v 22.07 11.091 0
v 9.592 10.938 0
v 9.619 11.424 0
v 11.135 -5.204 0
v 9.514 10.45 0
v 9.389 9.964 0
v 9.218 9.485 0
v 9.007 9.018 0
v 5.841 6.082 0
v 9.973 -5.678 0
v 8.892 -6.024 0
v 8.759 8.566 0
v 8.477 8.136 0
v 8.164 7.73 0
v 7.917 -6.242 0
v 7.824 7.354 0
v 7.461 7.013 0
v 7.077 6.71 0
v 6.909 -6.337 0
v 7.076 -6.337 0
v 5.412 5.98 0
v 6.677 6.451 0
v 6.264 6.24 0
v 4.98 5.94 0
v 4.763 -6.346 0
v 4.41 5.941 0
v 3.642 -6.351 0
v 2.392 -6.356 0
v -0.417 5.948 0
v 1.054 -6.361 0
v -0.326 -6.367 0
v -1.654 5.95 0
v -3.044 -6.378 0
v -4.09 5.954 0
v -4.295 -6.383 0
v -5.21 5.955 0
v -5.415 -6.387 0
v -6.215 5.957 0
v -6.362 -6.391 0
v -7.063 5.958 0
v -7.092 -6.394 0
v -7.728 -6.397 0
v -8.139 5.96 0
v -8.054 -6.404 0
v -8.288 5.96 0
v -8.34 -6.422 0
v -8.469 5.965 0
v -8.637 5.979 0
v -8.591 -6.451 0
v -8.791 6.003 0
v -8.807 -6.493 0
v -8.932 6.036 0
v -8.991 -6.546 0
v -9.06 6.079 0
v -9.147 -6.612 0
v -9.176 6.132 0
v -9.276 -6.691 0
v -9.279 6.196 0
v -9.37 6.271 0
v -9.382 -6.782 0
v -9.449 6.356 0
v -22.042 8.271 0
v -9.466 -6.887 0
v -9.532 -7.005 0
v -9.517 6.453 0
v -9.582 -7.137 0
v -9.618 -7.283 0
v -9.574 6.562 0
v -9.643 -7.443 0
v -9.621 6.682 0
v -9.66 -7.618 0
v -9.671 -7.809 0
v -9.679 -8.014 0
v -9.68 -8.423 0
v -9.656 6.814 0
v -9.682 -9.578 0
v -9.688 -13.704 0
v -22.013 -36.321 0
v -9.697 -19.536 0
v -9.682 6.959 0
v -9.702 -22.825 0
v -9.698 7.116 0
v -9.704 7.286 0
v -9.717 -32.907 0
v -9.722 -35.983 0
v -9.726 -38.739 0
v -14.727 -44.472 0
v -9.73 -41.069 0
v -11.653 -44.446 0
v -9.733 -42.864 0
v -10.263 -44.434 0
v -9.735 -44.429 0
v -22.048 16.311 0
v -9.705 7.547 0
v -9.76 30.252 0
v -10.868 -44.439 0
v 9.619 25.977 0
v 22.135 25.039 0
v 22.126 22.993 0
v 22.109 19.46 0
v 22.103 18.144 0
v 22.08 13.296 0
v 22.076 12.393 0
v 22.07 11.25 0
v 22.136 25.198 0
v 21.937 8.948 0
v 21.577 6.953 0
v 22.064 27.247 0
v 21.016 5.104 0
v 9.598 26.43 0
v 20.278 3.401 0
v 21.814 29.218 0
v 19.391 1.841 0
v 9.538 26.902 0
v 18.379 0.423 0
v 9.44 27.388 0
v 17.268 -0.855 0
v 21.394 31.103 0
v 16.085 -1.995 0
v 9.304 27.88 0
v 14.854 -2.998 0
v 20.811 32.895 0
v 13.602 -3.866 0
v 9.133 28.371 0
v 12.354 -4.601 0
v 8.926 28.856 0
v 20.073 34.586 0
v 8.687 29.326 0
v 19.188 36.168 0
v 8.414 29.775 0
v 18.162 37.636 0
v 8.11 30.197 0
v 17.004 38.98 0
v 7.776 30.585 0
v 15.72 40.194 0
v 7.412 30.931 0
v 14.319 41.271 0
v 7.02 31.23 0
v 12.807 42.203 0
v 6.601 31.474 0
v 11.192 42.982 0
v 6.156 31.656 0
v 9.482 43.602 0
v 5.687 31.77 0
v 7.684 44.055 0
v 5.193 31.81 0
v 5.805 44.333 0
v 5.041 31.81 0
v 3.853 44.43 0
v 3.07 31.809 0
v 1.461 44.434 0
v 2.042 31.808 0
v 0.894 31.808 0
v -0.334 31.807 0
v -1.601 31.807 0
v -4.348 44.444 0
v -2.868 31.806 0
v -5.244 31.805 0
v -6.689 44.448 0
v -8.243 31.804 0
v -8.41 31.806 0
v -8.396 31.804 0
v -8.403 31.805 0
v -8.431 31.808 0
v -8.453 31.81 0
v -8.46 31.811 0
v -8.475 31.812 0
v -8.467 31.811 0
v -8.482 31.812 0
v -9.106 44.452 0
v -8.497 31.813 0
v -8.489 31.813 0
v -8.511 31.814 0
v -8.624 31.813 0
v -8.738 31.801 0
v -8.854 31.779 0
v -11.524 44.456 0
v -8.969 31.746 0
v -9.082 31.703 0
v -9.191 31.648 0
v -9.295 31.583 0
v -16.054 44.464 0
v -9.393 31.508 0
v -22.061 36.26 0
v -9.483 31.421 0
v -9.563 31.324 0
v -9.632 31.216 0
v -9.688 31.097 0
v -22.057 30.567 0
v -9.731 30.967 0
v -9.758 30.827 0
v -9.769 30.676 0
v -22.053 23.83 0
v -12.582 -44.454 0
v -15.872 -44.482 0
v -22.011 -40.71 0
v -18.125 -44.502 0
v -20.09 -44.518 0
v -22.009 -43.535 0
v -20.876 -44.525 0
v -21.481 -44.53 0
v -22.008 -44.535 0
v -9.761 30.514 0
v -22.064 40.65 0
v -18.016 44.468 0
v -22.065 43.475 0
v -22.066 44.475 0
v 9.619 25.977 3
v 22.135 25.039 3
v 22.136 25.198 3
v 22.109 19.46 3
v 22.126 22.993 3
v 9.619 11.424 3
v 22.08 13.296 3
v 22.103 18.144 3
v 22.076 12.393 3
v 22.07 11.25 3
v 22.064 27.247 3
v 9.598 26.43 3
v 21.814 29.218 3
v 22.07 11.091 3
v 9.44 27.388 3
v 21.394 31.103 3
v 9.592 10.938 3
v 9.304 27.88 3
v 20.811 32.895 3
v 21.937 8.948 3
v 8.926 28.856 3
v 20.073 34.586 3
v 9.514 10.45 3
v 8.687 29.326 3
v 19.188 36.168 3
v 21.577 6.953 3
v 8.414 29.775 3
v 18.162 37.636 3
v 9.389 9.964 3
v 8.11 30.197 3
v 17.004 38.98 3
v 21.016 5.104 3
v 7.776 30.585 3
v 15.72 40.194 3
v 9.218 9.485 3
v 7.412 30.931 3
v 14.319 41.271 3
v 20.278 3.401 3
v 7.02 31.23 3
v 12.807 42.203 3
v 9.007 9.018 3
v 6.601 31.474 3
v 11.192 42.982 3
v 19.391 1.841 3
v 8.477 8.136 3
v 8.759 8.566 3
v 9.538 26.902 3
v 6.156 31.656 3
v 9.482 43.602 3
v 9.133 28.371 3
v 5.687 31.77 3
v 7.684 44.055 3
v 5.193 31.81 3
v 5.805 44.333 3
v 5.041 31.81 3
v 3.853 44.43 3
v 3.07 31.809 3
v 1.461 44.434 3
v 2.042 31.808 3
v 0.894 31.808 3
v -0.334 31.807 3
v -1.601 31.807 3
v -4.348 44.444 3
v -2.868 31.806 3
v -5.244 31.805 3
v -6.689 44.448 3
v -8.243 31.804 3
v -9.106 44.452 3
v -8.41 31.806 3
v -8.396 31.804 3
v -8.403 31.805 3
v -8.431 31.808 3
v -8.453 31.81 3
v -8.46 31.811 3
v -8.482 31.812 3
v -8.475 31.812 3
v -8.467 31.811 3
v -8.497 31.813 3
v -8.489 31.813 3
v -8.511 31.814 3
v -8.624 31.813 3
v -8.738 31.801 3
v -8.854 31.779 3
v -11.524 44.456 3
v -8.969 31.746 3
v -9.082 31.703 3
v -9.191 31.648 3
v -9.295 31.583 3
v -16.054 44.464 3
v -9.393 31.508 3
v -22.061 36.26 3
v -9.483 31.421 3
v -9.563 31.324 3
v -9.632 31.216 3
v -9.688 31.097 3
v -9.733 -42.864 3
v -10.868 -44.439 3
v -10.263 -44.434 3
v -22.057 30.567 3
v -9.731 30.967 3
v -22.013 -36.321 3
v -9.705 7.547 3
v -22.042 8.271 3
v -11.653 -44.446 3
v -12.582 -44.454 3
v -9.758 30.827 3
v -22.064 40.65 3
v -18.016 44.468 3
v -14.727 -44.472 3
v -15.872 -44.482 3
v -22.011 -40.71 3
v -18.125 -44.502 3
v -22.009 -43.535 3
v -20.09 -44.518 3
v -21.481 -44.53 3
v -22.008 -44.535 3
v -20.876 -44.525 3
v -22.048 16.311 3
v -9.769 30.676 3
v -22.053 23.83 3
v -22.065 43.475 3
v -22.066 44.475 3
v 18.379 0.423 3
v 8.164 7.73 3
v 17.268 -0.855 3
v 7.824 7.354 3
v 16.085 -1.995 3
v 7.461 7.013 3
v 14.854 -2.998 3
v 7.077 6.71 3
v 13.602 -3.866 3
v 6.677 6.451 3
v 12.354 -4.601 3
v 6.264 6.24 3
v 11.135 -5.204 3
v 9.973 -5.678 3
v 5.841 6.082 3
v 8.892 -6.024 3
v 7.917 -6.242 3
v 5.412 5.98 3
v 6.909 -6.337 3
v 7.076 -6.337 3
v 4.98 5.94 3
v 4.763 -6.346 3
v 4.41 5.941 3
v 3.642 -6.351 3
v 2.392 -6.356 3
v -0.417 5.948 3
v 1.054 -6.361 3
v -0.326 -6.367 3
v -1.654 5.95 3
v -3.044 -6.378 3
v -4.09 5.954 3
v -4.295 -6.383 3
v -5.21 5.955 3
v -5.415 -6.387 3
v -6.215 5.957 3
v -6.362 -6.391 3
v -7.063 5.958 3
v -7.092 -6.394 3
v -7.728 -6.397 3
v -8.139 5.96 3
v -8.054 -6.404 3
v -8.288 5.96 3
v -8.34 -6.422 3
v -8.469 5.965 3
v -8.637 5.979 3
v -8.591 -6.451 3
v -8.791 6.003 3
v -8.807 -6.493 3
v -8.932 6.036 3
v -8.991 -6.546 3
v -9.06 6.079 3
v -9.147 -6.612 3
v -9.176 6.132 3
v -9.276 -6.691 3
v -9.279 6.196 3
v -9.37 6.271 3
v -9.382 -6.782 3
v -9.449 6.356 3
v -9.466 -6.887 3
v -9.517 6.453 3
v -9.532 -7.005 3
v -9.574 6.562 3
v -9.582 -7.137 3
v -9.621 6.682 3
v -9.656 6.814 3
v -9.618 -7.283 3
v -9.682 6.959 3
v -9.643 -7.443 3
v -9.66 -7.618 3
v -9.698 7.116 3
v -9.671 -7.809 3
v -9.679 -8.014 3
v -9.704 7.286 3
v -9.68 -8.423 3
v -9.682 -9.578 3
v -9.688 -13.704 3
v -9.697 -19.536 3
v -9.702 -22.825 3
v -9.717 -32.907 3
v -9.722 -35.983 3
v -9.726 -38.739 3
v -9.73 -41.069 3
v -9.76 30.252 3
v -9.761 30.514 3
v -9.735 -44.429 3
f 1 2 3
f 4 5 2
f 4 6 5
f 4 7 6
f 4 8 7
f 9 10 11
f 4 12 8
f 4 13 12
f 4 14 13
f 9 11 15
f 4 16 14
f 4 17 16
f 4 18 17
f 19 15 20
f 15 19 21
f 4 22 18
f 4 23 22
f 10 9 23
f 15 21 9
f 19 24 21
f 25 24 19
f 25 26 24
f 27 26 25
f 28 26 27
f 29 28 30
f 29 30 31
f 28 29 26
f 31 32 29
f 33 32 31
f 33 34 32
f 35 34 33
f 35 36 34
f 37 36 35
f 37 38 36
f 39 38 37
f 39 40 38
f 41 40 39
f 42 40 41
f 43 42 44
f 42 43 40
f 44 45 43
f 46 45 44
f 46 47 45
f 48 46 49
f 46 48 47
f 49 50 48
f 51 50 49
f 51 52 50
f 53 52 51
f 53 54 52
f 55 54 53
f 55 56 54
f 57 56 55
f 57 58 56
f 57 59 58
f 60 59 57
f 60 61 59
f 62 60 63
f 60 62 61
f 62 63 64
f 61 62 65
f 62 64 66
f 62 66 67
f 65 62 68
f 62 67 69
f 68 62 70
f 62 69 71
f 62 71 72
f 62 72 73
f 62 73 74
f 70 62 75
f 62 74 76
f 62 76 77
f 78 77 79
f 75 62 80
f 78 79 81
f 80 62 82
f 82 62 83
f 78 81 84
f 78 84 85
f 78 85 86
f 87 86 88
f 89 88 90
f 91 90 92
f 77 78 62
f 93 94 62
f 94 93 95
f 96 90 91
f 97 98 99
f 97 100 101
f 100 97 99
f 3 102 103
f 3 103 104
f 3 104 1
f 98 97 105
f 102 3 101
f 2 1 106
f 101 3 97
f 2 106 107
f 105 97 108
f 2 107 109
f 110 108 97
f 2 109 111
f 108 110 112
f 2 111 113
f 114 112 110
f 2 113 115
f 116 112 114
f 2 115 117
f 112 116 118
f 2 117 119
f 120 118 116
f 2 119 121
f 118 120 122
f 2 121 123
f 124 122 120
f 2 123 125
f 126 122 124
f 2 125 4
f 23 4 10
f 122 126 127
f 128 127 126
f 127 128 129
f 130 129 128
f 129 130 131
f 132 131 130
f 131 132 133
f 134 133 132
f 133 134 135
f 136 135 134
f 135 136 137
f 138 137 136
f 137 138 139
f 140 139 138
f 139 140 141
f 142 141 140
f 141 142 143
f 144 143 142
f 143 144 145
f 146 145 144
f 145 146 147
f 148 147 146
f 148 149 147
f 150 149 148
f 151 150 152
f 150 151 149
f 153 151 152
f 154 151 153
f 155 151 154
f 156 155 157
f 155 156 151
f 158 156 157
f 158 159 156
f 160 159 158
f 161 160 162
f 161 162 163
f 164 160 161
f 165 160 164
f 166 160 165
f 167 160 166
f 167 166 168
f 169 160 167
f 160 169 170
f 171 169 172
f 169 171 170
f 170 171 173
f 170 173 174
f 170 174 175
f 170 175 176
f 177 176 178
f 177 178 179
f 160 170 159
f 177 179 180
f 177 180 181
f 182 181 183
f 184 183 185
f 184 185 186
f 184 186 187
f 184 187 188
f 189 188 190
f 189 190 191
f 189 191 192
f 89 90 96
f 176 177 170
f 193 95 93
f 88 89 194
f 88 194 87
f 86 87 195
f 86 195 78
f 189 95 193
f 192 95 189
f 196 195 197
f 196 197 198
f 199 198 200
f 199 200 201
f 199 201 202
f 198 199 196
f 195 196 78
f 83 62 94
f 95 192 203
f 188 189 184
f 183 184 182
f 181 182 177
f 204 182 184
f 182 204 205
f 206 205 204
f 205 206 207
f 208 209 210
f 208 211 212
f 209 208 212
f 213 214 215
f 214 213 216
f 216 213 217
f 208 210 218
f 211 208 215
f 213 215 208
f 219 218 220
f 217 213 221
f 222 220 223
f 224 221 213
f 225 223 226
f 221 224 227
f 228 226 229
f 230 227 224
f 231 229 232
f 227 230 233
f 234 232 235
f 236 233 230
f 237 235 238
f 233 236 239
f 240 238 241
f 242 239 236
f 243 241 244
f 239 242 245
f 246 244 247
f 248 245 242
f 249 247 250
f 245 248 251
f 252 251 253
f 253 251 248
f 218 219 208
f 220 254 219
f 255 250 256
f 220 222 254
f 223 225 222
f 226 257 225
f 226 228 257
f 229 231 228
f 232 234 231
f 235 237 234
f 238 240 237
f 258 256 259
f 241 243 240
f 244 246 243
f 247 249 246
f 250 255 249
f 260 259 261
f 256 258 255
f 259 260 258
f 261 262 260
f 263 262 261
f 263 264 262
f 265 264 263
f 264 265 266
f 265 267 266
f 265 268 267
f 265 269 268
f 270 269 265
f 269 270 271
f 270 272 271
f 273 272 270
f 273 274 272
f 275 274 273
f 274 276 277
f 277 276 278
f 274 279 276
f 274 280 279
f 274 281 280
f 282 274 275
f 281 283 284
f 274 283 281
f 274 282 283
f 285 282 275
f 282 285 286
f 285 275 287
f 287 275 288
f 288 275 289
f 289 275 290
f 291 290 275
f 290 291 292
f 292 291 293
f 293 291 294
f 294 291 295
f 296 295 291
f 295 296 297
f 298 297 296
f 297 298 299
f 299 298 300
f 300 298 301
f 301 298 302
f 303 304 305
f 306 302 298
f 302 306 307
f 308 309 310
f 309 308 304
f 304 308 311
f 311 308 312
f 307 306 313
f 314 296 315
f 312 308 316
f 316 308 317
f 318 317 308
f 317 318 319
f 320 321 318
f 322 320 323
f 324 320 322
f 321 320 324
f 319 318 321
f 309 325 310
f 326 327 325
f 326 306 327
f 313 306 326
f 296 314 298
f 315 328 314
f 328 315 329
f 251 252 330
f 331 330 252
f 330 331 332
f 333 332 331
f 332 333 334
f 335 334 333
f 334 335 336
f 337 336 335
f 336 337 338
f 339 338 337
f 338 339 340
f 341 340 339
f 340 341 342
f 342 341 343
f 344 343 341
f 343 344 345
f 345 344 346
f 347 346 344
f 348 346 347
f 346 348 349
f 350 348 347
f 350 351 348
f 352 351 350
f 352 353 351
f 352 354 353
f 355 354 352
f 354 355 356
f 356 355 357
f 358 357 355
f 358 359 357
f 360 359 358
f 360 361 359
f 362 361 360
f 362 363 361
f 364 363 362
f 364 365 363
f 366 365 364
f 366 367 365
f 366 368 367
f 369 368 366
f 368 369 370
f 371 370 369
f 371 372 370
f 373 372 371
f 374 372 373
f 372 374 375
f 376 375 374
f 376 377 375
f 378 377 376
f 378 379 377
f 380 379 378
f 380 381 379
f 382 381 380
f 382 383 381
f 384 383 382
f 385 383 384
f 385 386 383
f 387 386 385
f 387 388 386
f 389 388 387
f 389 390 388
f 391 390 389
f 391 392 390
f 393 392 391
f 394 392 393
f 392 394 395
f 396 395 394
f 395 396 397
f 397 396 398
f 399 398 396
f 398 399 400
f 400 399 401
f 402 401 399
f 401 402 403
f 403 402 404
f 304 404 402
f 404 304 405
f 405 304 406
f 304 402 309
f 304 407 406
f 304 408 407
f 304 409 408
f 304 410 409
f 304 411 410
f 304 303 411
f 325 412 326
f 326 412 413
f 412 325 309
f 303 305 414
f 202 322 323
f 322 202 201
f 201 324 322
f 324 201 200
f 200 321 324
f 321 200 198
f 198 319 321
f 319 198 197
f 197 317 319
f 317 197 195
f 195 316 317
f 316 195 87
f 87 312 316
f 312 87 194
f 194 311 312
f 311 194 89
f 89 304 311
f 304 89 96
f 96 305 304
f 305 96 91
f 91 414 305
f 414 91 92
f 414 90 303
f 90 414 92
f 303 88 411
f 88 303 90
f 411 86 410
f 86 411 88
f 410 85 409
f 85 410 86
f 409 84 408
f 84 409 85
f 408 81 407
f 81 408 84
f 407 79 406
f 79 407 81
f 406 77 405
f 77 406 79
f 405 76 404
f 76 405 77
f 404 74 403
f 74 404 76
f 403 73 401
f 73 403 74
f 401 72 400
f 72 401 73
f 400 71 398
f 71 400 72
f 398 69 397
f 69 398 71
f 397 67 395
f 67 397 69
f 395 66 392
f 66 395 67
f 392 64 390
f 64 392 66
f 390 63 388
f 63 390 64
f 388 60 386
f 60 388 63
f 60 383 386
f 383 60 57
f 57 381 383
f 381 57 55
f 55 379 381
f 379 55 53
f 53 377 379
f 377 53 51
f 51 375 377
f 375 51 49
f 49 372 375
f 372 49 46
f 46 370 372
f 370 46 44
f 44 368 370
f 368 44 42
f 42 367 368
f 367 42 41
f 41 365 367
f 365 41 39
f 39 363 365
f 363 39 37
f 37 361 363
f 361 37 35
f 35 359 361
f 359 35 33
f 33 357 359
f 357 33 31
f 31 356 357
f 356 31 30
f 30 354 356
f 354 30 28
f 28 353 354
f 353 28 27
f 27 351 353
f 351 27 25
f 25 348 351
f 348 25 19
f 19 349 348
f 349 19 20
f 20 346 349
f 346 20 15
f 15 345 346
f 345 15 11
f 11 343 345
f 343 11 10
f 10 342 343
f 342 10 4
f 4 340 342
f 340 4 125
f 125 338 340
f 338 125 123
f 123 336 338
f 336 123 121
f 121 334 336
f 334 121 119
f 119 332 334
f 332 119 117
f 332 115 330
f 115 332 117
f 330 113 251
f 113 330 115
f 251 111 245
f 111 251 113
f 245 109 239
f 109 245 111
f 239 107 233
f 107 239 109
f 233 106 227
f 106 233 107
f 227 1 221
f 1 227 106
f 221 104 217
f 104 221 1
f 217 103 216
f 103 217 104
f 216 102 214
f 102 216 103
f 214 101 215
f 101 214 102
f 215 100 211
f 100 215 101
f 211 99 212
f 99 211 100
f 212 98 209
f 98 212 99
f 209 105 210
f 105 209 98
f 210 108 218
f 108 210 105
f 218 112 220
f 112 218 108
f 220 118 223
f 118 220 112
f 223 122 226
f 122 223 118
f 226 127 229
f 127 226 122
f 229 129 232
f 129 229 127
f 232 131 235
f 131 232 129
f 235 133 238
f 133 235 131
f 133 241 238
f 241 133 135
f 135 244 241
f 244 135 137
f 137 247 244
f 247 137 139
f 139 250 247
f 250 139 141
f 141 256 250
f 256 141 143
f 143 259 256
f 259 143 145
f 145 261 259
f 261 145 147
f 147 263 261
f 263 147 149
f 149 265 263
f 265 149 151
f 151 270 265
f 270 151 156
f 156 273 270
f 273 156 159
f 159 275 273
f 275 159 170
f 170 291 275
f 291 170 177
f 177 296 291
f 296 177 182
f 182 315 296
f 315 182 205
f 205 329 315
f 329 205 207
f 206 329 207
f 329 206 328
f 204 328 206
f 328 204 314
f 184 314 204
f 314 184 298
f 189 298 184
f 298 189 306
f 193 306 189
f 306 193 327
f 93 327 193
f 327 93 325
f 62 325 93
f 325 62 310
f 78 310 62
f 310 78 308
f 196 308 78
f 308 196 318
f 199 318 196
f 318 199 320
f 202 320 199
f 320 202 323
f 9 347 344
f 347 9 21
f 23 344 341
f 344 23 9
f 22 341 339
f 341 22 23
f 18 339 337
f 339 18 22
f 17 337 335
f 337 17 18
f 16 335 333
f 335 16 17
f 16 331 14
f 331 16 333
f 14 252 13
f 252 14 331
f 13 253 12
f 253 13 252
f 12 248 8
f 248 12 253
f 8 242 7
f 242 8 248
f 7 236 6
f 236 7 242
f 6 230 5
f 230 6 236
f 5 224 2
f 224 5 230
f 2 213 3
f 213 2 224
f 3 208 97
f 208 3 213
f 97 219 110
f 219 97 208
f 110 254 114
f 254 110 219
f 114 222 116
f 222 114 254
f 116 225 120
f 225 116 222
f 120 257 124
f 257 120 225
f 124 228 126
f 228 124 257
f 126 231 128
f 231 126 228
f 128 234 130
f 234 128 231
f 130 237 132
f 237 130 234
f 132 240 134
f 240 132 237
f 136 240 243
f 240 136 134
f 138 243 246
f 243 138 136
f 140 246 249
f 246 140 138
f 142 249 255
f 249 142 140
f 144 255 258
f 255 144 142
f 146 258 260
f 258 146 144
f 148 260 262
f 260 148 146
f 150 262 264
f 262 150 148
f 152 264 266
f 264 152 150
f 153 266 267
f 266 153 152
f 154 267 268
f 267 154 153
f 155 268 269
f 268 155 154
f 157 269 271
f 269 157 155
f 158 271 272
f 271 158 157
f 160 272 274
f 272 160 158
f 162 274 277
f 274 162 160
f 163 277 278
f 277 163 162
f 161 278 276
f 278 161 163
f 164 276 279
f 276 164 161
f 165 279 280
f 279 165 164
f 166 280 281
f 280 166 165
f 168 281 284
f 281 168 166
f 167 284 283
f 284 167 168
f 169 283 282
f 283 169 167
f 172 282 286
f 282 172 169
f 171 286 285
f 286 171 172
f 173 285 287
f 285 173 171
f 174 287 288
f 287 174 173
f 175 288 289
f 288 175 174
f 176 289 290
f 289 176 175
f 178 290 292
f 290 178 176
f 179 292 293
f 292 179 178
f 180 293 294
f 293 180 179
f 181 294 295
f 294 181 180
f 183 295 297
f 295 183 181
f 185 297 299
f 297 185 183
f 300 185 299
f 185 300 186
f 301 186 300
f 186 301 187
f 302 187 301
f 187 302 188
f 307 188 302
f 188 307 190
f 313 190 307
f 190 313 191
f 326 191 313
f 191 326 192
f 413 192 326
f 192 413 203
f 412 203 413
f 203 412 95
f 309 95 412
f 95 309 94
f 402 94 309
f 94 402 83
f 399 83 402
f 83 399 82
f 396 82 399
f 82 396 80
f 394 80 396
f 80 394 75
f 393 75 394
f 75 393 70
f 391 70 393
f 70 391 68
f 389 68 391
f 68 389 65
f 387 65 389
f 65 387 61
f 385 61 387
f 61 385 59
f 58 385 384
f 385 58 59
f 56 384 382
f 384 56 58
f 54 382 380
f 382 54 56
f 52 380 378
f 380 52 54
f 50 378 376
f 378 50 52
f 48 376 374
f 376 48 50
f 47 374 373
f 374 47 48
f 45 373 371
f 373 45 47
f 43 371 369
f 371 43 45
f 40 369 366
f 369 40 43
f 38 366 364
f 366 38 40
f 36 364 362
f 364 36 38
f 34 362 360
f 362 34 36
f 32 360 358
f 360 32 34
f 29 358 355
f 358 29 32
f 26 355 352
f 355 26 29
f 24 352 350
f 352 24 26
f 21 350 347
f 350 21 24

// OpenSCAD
// Generated from 交通部公路局（原交通部公路總局）「新式號牌使用之英文字、數字字體」author trace
fudge = 0.1;

module glyph_2012_P(h = 3) {
  difference() {
    linear_extrude(height = h)
      polygon(points = [[-22.0661, 44.4746], [-22.0654, 43.475], [-22.0636, 40.65], [-22.0607, 36.2603], [-22.057, 30.5669], [-22.0527, 23.8303], [-22.0478, 16.3114], [-22.0425, 8.271], [-22.0371, -0.0302], [-22.0317, -8.3314], [-22.0265, -16.3719], [-22.0216, -23.8908], [-22.0172, -30.6273], [-22.0135, -36.3208], [-22.0107, -40.7105], [-22.0088, -43.5355], [-22.0082, -44.5351], [-21.8704, -44.5339], [-21.4808, -44.5305], [-20.8756, -44.5253], [-20.0905, -44.5185], [-19.1617, -44.5105], [-18.1249, -44.5016], [-17.0163, -44.492], [-15.8717, -44.4821], [-14.7271, -44.4723], [-13.6185, -44.4627], [-12.5817, -44.4537], [-11.6529, -44.4457], [-10.8678, -44.4389], [-10.2626, -44.4337], [-9.873, -44.4304], [-9.7352, -44.4292], [-9.7346, -44.0202], [-9.7328, -42.8644], [-9.7301, -41.0686], [-9.7265, -38.7393], [-9.7223, -35.9832], [-9.7175, -32.9071], [-9.7125, -29.6176], [-9.7073, -26.2215], [-9.7021, -22.8253], [-9.697, -19.5359], [-9.6923, -16.4597], [-9.6881, -13.7037], [-9.6845, -11.3744], [-9.6817, -9.5785], [-9.68, -8.4228], [-9.6793, -8.0138], [-9.6715, -7.8086], [-9.6604, -7.6185], [-9.6435, -7.4435], [-9.6182, -7.283], [-9.5819, -7.137], [-9.5322, -7.005], [-9.4664, -6.8868], [-9.382, -6.7821], [-9.2763, -6.6907], [-9.1469, -6.6122], [-8.9912, -6.5463], [-8.8066, -6.4928], [-8.5906, -6.4514], [-8.3405, -6.4217], [-8.0538, -6.4036], [-7.7281, -6.3967], [-7.5618, -6.396], [-7.092, -6.3941], [-6.3619, -6.3912], [-5.415, -6.3873], [-4.2946, -6.3828], [-3.0441, -6.3777], [-1.7068, -6.3723], [-0.3262, -6.3667], [1.0544, -6.3612], [2.3917, -6.3557], [3.6422, -6.3507], [4.7626, -6.3461], [5.7095, -6.3423], [6.4396, -6.3394], [6.9094, -6.3375], [7.0757, -6.3368], [7.9172, -6.2425], [8.8916, -6.0236], [9.9729, -5.6781], [11.1355, -5.2045], [12.3538, -4.6011], [13.6019, -3.8661], [14.8542, -2.9979], [16.085, -1.9948], [17.2685, -0.855], [18.379, 0.4231], [19.3909, 1.8412], [20.2783, 3.4011], [21.0156, 5.1043], [21.5771, 6.9527], [21.937, 8.9479], [22.0696, 11.0915], [22.0704, 11.2499], [22.0725, 11.6976], [22.0758, 12.3933], [22.0801, 13.2956], [22.0851, 14.3632], [22.0907, 15.5548], [22.0967, 16.829], [22.1029, 18.1445], [22.1092, 19.4601], [22.1152, 20.7343], [22.1208, 21.9259], [22.1258, 22.9935], [22.1301, 23.8958], [22.1334, 24.5914], [22.1355, 25.0391], [22.1362, 25.1976], [22.0637, 27.2473], [21.8137, 29.2183], [21.3937, 31.1033], [20.8111, 32.8949], [20.0733, 34.5858], [19.1879, 36.1685], [18.1623, 37.6357], [17.004, 38.9801], [15.7204, 40.1944], [14.3189, 41.271], [12.8071, 42.2027], [11.1923, 42.9822], [9.4822, 43.602], [7.684, 44.0548], [5.8053, 44.3332], [3.8535, 44.4299], [3.5624, 44.4304], [2.7397, 44.4318], [1.4615, 44.434], [-0.1965, 44.4369], [-2.1582, 44.4403], [-4.3476, 44.4441], [-6.689, 44.4481], [-9.1063, 44.4523], [-11.5236, 44.4564], [-13.865, 44.4605], [-16.0545, 44.4643], [-18.0162, 44.4676], [-19.6741, 44.4705], [-20.9524, 44.4727], [-21.775, 44.4741]]);
    translate([0, 0, -fudge])
      linear_extrude(height = h + 2 * fudge)
        polygon(points = [[-8.5114, 31.8141], [-8.504, 31.8137], [-8.4966, 31.8133], [-8.4893, 31.8128], [-8.482, 31.8124], [-8.4747, 31.8119], [-8.4674, 31.8113], [-8.4601, 31.8108], [-8.4528, 31.8102], [-8.4456, 31.8095], [-8.4384, 31.8088], [-8.4312, 31.8081], [-8.424, 31.8073], [-8.4168, 31.8065], [-8.4097, 31.8057], [-8.4026, 31.8047], [-8.3956, 31.8038], [-8.243, 31.8038], [-7.8117, 31.804], [-7.1415, 31.8043], [-6.2723, 31.8047], [-5.2438, 31.8052], [-4.0959, 31.8057], [-2.8684, 31.8062], [-1.6011, 31.8068], [-0.3337, 31.8073], [0.8938, 31.8079], [2.0417, 31.8084], [3.0702, 31.8088], [3.9394, 31.8092], [4.6096, 31.8095], [5.0409, 31.8097], [5.1935, 31.8098], [5.6868, 31.7704], [6.1564, 31.6561], [6.6012, 31.4736], [7.02, 31.2297], [7.4119, 30.9311], [7.7756, 30.5847], [8.11, 30.1971], [8.414, 29.7753], [8.6866, 29.3259], [8.9265, 28.8557], [9.1328, 28.3714], [9.3042, 27.8799], [9.4396, 27.388], [9.538, 26.9024], [9.5983, 26.4298], [9.6192, 25.977], [9.6192, 25.8136], [9.6192, 25.3517], [9.6192, 24.634], [9.6192, 23.7032], [9.6192, 22.6018], [9.6192, 21.3725], [9.6192, 20.0579], [9.6192, 18.7007], [9.6192, 17.3435], [9.6192, 16.0289], [9.6192, 14.7996], [9.6192, 13.6982], [9.6192, 12.7673], [9.6192, 12.0497], [9.6192, 11.5878], [9.6192, 11.4243], [9.5924, 10.9382], [9.5144, 10.45], [9.3886, 9.9641], [9.2184, 9.4852], [9.0074, 9.0178], [8.759, 8.5664], [8.4766, 8.1357], [8.1638, 7.7302], [7.824, 7.3545], [7.4606, 7.013], [7.0771, 6.7105], [6.677, 6.4513], [6.2638, 6.2402], [5.8408, 6.0816], [5.4116, 5.9801], [4.9796, 5.9403], [4.8306, 5.9405], [4.4096, 5.9411], [3.7553, 5.9421], [2.9066, 5.9434], [1.9025, 5.9449], [0.7818, 5.9466], [-0.4167, 5.9484], [-1.654, 5.9502], [-2.8913, 5.9521], [-4.0898, 5.9539], [-5.2105, 5.9555], [-6.2146, 5.9571], [-7.0633, 5.9583], [-7.7176, 5.9593], [-8.1386, 5.9599], [-8.2876, 5.9602], [-8.4693, 5.965], [-8.6371, 5.9791], [-8.7914, 6.0026], [-8.9324, 6.0357], [-9.0604, 6.0789], [-9.1759, 6.1322], [-9.279, 6.1961], [-9.3701, 6.2707], [-9.4495, 6.3563], [-9.5175, 6.4532], [-9.5744, 6.5617], [-9.6206, 6.682], [-9.6564, 6.8143], [-9.682, 6.959], [-9.6978, 7.1163], [-9.7041, 7.2865], [-9.7048, 7.5473], [-9.7066, 8.2845], [-9.7094, 9.43], [-9.713, 10.9157], [-9.7173, 12.6736], [-9.7221, 14.6356], [-9.7272, 16.7337], [-9.7325, 18.8999], [-9.7378, 21.066], [-9.7429, 23.1642], [-9.7477, 25.1262], [-9.752, 26.8841], [-9.7556, 28.3698], [-9.7584, 29.5152], [-9.7602, 30.2524], [-9.7608, 30.5132], [-9.7608, 30.5133], [-9.7608, 30.5133], [-9.7608, 30.5133], [-9.7608, 30.5133], [-9.7608, 30.5133], [-9.7608, 30.5134], [-9.7608, 30.5134], [-9.7608, 30.5135], [-9.7608, 30.5135], [-9.7608, 30.5135], [-9.7608, 30.5136], [-9.7608, 30.5136], [-9.7608, 30.5136], [-9.7608, 30.5137], [-9.7608, 30.5137], [-9.7608, 30.5137], [-9.7689, 30.6758], [-9.7585, 30.8271], [-9.7312, 30.9675], [-9.6885, 31.0971], [-9.6318, 31.2159], [-9.5627, 31.3239], [-9.4826, 31.4212], [-9.3929, 31.5076], [-9.2952, 31.5834], [-9.191, 31.6484], [-9.0817, 31.7026], [-8.9689, 31.7462], [-8.8539, 31.7791], [-8.7384, 31.8014], [-8.6237, 31.813], [-8.5114, 31.814], [-8.5114, 31.814], [-8.5114, 31.814], [-8.5114, 31.814], [-8.5114, 31.814], [-8.5114, 31.814], [-8.5114, 31.814], [-8.5114, 31.814], [-8.5114, 31.814], [-8.5114, 31.814], [-8.5114, 31.814], [-8.5114, 31.8141], [-8.5114, 31.8141], [-8.5114, 31.8141], [-8.5114, 31.8141], [-8.5114, 31.8141]]);
  }
}

glyph_2012_P();
